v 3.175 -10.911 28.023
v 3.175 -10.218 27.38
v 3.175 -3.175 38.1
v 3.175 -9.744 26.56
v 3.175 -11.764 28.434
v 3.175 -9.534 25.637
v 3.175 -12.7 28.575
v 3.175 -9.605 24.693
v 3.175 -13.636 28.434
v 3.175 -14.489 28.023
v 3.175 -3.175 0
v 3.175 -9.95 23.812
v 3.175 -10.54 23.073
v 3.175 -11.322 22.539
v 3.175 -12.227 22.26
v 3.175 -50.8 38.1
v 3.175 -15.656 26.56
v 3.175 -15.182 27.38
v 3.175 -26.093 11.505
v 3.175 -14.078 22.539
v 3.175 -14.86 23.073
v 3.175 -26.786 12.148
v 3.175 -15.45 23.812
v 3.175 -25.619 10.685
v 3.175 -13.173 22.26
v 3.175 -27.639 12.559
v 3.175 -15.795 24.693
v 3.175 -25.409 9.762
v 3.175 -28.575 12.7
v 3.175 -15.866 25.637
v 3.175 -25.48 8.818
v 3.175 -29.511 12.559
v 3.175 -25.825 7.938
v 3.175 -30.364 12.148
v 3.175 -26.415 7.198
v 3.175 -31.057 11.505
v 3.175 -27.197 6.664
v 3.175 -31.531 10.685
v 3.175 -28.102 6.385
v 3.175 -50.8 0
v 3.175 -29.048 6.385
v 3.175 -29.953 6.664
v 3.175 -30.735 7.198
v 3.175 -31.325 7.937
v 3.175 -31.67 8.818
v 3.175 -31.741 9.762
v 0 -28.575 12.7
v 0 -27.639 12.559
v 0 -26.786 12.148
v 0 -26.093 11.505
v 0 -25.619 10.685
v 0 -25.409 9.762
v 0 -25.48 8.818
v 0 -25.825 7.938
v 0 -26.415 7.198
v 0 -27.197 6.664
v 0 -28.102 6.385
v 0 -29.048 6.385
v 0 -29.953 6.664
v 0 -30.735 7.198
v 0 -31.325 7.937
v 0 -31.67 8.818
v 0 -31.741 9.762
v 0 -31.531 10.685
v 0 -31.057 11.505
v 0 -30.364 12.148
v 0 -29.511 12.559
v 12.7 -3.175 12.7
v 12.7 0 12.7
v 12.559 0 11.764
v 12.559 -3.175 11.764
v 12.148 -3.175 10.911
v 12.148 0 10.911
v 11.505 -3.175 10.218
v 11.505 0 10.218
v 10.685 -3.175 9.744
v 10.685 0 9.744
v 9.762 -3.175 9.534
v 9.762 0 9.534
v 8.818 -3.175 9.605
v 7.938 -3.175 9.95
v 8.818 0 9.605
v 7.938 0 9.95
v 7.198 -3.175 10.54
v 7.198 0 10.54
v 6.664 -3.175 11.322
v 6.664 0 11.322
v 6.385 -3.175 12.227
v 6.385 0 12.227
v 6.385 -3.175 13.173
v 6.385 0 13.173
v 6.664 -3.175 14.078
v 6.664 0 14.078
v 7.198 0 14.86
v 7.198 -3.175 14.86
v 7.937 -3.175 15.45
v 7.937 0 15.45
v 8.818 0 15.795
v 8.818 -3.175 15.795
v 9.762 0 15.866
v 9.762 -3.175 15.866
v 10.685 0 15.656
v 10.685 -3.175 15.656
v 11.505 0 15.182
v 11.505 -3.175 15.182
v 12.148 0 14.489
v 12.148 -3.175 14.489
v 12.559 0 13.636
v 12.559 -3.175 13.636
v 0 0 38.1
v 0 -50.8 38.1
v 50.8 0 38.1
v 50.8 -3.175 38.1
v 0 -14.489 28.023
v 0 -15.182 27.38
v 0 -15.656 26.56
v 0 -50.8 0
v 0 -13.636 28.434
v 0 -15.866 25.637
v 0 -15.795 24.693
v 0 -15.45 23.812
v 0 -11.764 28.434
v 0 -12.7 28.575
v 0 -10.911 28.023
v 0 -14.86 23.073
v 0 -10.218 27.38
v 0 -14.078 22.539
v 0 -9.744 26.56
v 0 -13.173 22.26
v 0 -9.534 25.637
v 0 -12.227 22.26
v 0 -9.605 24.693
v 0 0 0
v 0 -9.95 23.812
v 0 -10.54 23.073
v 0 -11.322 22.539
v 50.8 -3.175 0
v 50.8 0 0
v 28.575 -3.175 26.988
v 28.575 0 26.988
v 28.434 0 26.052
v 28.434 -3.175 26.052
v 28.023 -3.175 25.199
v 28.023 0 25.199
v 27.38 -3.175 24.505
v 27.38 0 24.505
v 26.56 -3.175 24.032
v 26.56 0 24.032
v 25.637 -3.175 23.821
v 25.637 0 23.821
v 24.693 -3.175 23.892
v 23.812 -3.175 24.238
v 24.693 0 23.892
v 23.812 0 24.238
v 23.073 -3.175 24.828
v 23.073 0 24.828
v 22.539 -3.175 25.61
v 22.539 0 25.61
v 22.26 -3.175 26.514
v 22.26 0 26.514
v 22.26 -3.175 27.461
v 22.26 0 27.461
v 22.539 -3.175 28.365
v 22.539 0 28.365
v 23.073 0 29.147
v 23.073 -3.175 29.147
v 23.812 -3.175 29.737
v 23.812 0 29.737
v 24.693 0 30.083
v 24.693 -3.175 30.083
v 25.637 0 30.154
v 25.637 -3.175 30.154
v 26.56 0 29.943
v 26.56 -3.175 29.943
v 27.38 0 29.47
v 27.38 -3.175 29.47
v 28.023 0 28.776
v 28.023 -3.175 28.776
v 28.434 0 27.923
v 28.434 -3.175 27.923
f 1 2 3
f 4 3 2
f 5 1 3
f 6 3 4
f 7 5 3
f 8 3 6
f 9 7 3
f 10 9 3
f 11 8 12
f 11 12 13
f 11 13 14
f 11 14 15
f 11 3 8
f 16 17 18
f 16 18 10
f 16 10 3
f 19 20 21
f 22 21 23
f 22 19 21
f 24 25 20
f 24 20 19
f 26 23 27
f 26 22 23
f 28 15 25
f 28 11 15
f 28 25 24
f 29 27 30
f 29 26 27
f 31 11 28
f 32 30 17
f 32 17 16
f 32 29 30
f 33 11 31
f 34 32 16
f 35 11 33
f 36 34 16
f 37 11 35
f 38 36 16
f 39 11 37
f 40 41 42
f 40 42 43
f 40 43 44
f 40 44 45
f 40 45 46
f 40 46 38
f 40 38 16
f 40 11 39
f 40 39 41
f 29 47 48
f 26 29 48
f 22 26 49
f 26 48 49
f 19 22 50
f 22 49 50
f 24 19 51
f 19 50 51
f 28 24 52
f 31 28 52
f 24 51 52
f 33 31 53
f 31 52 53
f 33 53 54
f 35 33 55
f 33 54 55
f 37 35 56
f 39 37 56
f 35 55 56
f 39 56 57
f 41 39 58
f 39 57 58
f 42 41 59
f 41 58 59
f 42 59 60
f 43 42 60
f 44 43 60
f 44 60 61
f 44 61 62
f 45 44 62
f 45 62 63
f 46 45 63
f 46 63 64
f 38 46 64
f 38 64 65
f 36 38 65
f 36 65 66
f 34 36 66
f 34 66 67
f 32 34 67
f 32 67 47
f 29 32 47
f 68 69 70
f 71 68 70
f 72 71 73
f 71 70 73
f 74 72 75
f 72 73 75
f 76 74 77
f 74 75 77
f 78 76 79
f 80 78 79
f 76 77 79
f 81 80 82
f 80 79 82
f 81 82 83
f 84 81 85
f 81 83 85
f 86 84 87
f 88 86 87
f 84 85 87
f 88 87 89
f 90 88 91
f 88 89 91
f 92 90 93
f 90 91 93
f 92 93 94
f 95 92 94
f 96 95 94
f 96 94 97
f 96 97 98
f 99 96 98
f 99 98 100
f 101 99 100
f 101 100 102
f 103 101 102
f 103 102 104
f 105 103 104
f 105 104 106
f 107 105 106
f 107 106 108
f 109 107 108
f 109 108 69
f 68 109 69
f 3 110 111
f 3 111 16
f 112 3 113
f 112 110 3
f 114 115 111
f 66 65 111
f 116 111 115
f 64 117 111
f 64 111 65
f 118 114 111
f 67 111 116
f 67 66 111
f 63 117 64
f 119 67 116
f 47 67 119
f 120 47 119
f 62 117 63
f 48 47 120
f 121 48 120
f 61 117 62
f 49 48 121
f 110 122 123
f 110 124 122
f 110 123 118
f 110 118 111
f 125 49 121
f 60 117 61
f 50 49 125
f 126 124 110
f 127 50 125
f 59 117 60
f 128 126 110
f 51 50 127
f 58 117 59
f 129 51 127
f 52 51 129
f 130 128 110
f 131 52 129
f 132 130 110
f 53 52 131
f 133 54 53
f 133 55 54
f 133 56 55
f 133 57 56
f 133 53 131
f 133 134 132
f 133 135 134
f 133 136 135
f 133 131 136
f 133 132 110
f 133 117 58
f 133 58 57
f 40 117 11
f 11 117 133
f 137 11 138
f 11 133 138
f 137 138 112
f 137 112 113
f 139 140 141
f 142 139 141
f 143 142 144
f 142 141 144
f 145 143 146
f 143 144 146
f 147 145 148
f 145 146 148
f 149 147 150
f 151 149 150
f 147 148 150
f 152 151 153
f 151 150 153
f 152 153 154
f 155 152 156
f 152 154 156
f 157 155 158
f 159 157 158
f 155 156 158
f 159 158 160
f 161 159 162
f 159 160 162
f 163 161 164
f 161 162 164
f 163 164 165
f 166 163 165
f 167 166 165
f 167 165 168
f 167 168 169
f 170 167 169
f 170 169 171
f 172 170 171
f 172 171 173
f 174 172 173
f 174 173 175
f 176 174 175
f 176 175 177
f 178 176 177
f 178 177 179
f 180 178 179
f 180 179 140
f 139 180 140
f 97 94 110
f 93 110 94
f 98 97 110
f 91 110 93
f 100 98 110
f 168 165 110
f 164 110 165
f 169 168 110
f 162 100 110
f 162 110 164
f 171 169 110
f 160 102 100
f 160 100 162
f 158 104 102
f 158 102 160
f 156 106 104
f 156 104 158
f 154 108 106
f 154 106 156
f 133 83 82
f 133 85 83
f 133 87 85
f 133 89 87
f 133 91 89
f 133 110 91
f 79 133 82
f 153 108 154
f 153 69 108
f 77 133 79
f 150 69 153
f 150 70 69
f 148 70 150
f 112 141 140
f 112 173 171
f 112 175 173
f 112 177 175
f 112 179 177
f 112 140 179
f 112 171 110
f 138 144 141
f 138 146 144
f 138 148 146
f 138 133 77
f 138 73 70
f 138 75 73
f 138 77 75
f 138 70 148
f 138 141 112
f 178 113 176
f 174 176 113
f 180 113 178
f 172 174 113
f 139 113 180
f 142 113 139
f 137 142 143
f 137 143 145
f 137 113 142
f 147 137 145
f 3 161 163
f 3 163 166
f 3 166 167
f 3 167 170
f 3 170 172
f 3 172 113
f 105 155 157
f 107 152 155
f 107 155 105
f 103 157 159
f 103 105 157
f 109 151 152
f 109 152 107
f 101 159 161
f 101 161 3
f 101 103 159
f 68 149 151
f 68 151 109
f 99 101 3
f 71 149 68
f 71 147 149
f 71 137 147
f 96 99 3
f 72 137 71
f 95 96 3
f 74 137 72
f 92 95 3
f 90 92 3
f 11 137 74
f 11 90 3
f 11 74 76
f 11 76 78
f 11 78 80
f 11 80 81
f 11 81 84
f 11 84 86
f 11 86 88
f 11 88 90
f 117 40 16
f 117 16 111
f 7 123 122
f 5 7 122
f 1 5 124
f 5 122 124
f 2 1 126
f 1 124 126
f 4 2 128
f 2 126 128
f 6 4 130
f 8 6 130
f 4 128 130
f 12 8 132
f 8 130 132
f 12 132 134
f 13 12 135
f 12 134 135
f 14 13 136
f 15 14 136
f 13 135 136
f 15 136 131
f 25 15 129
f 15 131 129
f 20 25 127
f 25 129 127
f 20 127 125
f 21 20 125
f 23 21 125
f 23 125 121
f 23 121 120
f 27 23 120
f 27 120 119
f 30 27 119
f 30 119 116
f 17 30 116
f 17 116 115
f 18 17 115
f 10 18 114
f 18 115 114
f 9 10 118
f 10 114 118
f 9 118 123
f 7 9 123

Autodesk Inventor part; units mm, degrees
ref_plane "YZ Plane" through (0, 0, 0) normal (1, 0, 0) x (0, 1, 0)
ref_plane "XZ Plane" through (0, 0, 0) normal (0, 1, 0) x (-1, 0, 0)
ref_plane "XY Plane" through (0, 0, 0) normal (0, 0, 1) x (1, 0, 0)
sketch "Sketch1" plane through (0, 0, 0) normal (0, 0, 1) x (1, 0, 0)
  line L0 (0, 0) -> (50.8, 0)
  line L1 (50.8, 0) -> (50.8, -3.175)
  line L2 (50.8, -3.175) -> (3.175, -3.175)
  line L3 (3.175, -3.175) -> (3.175, -50.8)
  line L4 (3.175, -50.8) -> (0, -50.8)
  line L5 (0, -50.8) -> (0, 0)
  dimension "d0" = 3.175
  dimension "d1" = 3.175
  dimension "d2" = 50.8
  dimension "d3" = 50.8
extrude "Extrusion1" add sketch "Sketch1" along normal blind 38.1
sketch "Sketch2" plane through (0, -50.8, 0) normal (-1, 0, 0) x (0, 0, 1)
  circle A0 centre (25.4, 38.1) radius 3.175
  circle A1 centre (9.525, 22.225) radius 3.175
  line L0 (0, 0) -> (0, 50.8) projected
  line L1 (0, 50.8) -> (38.1, 50.8) projected
  line L2 (0, 0) -> (38.1, 0) projected
  dimension "d6" = 6.35
  dimension "d7" = 6.35
  dimension "d8" = 9.525
  dimension "d9" = 25.4
  dimension "d12" = 12.7
  dimension "d13" = 22.225
extrude "Extrusion2" cut sketch "Sketch2" against normal blind 3.175
sketch "Sketch3" plane through (0, 0, 0) normal (0, 1, 0) x (1, 0, 0)
  circle A0 centre (25.4, -26.9875) radius 3.175
  circle A1 centre (9.525, -12.7) radius 3.175
  line L0 (0, 0) -> (0, -38.1) projected
  line L1 (50.8, -38.1) -> (0, -38.1) projected
  line L2 (50.8, 0) -> (50.8, -38.1) projected
  line L3 (0, 0) -> (50.8, 0) projected
  dimension "d14" = 9.525
  dimension "d15" = 11.1125
  dimension "d16" = 25.4
  dimension "d17" = 6.35
  dimension "d18" = 6.35
  dimension "d19" = 12.7
extrude "Extrusion3" cut sketch "Sketch3" against normal blind 25.4 contours A0 | A1
properties part number "15102898-16-P-0804" material "Aluminum 6061"
